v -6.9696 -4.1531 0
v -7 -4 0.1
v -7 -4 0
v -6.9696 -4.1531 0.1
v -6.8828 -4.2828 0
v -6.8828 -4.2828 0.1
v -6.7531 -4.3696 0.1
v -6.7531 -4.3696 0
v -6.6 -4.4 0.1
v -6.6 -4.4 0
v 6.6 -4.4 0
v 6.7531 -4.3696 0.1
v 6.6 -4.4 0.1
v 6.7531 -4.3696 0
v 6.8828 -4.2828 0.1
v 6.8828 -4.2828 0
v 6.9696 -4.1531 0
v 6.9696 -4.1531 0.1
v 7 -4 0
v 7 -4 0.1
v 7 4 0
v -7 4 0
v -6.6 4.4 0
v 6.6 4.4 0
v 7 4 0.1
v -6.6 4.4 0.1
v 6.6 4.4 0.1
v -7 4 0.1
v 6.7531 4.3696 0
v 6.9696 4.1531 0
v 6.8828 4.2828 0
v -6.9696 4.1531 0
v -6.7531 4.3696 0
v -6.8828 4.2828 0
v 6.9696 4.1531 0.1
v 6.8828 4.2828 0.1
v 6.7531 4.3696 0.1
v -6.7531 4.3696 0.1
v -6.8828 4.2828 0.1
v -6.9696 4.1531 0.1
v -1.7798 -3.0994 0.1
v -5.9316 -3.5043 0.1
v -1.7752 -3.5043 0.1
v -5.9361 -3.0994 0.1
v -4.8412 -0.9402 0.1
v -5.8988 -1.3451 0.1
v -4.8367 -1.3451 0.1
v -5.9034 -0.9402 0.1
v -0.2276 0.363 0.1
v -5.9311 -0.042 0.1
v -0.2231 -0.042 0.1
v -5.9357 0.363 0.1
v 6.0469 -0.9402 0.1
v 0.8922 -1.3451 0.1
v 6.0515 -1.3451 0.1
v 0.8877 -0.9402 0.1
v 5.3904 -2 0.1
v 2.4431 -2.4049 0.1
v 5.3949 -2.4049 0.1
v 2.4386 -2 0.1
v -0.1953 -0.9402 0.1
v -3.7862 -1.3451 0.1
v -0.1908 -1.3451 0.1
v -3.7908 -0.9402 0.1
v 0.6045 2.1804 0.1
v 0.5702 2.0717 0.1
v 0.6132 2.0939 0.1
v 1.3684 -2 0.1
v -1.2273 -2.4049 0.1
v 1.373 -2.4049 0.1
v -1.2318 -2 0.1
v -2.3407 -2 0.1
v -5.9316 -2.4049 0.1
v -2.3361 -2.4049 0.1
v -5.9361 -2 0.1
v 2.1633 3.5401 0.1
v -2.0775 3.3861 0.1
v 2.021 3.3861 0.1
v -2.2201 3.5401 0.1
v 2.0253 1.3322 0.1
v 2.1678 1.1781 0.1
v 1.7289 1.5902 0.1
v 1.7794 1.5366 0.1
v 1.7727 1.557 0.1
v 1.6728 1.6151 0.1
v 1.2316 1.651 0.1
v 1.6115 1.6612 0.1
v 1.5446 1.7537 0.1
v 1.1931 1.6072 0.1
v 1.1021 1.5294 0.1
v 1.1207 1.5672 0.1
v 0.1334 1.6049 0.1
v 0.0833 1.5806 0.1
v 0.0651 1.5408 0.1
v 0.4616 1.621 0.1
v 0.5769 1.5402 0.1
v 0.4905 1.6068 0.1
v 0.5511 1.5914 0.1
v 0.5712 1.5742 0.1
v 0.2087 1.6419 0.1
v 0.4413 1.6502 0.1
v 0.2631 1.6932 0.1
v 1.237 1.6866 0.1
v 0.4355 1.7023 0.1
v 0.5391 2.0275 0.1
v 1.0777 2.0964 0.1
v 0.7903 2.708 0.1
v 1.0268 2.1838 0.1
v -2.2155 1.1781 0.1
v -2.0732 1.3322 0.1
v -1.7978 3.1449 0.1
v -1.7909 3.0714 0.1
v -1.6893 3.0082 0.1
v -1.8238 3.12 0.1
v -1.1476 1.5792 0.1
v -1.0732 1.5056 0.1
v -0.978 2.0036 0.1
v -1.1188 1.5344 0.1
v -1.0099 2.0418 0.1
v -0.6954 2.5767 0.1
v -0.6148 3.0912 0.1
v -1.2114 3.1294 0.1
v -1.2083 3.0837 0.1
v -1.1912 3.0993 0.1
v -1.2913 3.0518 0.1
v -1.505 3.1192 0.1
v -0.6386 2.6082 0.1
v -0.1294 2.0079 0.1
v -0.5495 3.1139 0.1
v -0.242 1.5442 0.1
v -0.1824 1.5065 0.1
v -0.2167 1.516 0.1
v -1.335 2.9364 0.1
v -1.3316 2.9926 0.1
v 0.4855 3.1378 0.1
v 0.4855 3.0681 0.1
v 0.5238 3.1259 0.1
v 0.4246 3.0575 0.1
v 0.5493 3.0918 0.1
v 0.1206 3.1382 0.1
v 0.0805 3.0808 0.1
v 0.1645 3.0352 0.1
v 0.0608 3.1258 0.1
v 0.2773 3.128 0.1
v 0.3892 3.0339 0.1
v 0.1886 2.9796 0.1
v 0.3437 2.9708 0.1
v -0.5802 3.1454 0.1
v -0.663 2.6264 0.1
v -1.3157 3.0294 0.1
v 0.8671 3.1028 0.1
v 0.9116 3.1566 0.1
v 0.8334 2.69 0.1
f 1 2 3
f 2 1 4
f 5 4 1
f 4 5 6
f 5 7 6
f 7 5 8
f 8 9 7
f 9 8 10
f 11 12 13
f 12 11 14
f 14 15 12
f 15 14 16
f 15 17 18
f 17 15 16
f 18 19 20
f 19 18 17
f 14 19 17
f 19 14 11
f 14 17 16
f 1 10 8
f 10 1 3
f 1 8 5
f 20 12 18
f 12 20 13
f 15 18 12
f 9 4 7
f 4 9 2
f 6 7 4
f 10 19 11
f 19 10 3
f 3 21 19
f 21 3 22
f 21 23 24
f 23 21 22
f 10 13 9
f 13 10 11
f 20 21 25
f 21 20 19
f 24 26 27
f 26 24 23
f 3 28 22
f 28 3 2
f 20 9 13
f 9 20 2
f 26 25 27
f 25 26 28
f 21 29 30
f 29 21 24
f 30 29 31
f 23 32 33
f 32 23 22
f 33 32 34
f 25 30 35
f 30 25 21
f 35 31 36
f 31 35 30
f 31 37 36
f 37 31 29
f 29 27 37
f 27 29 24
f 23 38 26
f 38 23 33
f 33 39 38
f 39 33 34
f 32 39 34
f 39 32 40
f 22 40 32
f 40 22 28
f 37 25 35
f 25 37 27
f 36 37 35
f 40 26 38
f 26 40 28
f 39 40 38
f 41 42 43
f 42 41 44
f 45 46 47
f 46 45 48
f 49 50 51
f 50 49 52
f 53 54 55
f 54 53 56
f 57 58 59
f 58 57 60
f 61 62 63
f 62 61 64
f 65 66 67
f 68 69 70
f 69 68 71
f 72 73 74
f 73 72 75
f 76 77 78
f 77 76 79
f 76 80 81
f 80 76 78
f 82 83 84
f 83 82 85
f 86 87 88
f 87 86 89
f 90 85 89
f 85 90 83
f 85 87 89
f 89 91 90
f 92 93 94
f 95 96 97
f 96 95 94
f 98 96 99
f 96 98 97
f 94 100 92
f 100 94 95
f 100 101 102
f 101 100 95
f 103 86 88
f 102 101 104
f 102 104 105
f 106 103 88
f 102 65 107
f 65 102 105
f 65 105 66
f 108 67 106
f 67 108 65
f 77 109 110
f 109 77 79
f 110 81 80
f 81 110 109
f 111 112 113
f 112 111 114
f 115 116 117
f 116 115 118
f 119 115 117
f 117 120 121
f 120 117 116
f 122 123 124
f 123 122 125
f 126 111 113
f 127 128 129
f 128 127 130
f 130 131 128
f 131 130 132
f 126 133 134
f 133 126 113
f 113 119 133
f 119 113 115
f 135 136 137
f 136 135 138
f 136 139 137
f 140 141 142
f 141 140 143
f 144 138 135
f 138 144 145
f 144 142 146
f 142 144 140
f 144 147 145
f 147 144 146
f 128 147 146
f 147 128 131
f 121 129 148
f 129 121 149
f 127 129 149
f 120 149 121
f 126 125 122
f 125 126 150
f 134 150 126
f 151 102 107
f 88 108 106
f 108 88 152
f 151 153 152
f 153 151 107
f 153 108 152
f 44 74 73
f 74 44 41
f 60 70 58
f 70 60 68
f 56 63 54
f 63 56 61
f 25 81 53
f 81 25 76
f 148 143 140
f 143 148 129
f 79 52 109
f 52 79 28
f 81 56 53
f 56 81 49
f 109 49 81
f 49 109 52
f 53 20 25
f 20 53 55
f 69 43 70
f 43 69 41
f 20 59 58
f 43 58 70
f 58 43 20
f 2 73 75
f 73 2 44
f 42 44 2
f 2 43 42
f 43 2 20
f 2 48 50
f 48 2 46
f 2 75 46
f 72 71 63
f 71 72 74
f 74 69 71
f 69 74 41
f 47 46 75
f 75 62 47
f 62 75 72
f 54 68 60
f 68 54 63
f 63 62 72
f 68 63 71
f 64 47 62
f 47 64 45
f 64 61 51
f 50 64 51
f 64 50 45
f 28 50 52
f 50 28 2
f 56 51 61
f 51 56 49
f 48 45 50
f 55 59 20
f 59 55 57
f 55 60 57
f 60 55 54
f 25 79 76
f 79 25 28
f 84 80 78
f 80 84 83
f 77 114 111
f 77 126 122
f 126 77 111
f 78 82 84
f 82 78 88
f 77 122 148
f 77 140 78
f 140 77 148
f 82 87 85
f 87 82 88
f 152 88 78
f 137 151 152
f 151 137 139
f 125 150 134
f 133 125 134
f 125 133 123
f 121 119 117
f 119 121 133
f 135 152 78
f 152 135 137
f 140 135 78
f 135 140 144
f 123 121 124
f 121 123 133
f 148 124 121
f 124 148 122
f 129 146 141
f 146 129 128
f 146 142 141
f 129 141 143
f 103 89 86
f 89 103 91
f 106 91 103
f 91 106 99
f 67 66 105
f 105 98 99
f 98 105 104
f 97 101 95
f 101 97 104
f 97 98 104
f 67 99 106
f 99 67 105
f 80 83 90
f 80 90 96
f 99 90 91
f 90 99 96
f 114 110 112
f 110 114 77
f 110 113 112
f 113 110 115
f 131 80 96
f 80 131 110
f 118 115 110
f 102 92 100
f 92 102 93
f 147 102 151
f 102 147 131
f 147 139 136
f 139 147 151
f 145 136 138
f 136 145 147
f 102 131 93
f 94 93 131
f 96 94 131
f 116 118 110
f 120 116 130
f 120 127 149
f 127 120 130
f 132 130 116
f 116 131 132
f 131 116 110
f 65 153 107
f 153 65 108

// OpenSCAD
// file: ../p/1-4cyli.scad
use <../lib.scad>
function ldraw_lib__1_4cyli() = [
// 0 Cylinder 0.25
// 0 Name: 1-4cyli.dat
// 0 Author: James Jessiman
// 0 !LDRAW_ORG Primitive UPDATE 2012-01
// 0 !LICENSE Licensed under CC BY 4.0 : see CAreadme.txt
// 
// 0 BFC CERTIFY CCW
  [0,"BFC","CERTIFY"],
  [0,"BFC","CCW"],
// 
// 0 !HISTORY 2002-03-23 [sbliss] Added BFC statement.
// 0 !HISTORY 2002-04-25 [PTadmin] Official Update 2002-02
// 0 !HISTORY 2007-06-22 [PTadmin] Header formatted for Contributor Agreement
// 0 !HISTORY 2008-07-01 [PTadmin] Official Update 2008-01
// 0 !HISTORY 2012-02-16 [Philo] Changed to CCW
// 0 !HISTORY 2012-03-30 [PTadmin] Official Update 2012-01
// 
// 
// 4 16 1 1 0 0.9239 1 0.3827 0.9239 0 0.3827 1 0 0
  [4,16,1,1,0,0.9239,1,0.3827,0.9239,0,0.3827,1,0,0],
// 5 24 1 0 0 1 1 0 0.9239 0 0.3827 1 0 -1
  [5,24,1,0,0,1,1,0,0.9239,0,0.3827,1,0,-1],
// 4 16 0.9239 1 0.3827 0.7071 1 0.7071 0.7071 0 0.7071 0.9239 0 0.3827
  [4,16,0.9239,1,0.3827,0.7071,1,0.7071,0.7071,0,0.7071,0.9239,0,0.3827],
// 5 24 0.9239 0 0.3827 0.9239 1 0.3827 0.7071 0 0.7071 1 0 0
  [5,24,0.9239,0,0.3827,0.9239,1,0.3827,0.7071,0,0.7071,1,0,0],
// 4 16 0.7071 1 0.7071 0.3827 1 0.9239 0.3827 0 0.9239 0.7071 0 0.7071
  [4,16,0.7071,1,0.7071,0.3827,1,0.9239,0.3827,0,0.9239,0.7071,0,0.7071],
// 5 24 0.7071 0 0.7071 0.7071 1 0.7071 0.3827 0 0.9239 0.9239 0 0.3827
  [5,24,0.7071,0,0.7071,0.7071,1,0.7071,0.3827,0,0.9239,0.9239,0,0.3827],
// 4 16 0.3827 1 0.9239 0 1 1 0 0 1 0.3827 0 0.9239
  [4,16,0.3827,1,0.9239,0,1,1,0,0,1,0.3827,0,0.9239],
// 5 24 0.3827 0 0.9239 0.3827 1 0.9239 0 0 1 0.7071 0 0.7071
  [5,24,0.3827,0,0.9239,0.3827,1,0.9239,0,0,1,0.7071,0,0.7071],
// 5 24 0 0 1 0 1 1 0.3827 0 0.9239 -1 0 1
  [5,24,0,0,1,0,1,1,0.3827,0,0.9239,-1,0,1],
];
module ldraw_lib__1_4cyli(step=0, col=false, unit=2/5, alt=false, line=0.2, solid=!$preview)
    makepoly(ldraw_lib__1_4cyli(), step=step, col=col, unit=unit, alt=alt, line=line, solid=solid);
ldraw_lib__1_4cyli(line=0.2);
// file: ../p/1-4chrd.scad
use <../lib.scad>
function ldraw_lib__1_4chrd() = [
// 0 Chord 0.25
// 0 Name: 1-4chrd.dat
// 0 Author: Max Martin Richter [MMR1988]
// 0 !LDRAW_ORG Primitive UPDATE 2023-05
// 0 !LICENSE Licensed under CC BY 4.0 : see CAreadme.txt
// 
// 0 BFC CERTIFY CCW
  [0,"BFC","CERTIFY"],
  [0,"BFC","CCW"],
// 
// 0 !HISTORY 2004-04-22 [PTadmin] Official Update 2004-02
// 0 !HISTORY 2007-10-09 [PTadmin] Header formatted for Contributor Agreement
// 0 !HISTORY 2008-07-01 [PTadmin] Official Update 2008-01
// 0 !HISTORY 2012-08-02 [MMR1988] Re-creation with PrimGen2 and Rectifier
// 0 !HISTORY 2012-08-09 [PTadmin] Official Update 2012-02
// 0 !HISTORY 2023-10-27 [OrionP] Change author to MMR1988 from hafhead
// 0 !HISTORY 2023-10-31 [OrionP] Official Update 2023-05
// 
// 4 16 0.9239 0 0.3827 0.3827 0 0.9239 0 0 1 1 0 0
  [4,16,0.9239,0,0.3827,0.3827,0,0.9239,0,0,1,1,0,0],
// 3 16 0.7071 0 0.7071 0.3827 0 0.9239 0.9239 0 0.3827
  [3,16,0.7071,0,0.7071,0.3827,0,0.9239,0.9239,0,0.3827],
];
module ldraw_lib__1_4chrd(step=0, col=false, unit=2/5, alt=false, line=0.2, solid=!$preview)
    makepoly(ldraw_lib__1_4chrd(), step=step, col=col, unit=unit, alt=alt, line=line, solid=solid);
ldraw_lib__1_4chrd(line=0.2);
// main file
use <../lib.scad>
use <../p/1-4chrd.scad>
use <../p/1-4cyli.scad>
function ldraw_lib__6501596f() = [
// 0 Sticker  1.1 x  1.7 with "WA" Header Letter
// 0 Name: 6501596f.dat
// 0 Author: Philippe Hurbain [Philo]
// 0 !LDRAW_ORG Part UPDATE 2024-10
// 0 !LICENSE Licensed under CC BY 4.0 : see CAreadme.txt
// 
// 0 BFC CERTIFY CCW
  [0,"BFC","CERTIFY"],
  [0,"BFC","CCW"],
// 
// 0 !KEYWORDS Addams Family, Set 76780, Wednesday
// 
// 0 !HISTORY 2024-12-01 [OrionP] Official Update 2024-10
// 
// 1 16 -16.5 -0.25 -10 -1 0 0 0 0.25 0 0 0 -1 1-4cyli.dat
  [1,16,-16.5,-0.25,-10,-1,0,0,0,0.25,0,0,0,-1, ldraw_lib__1_4cyli()],
// 1 16 16.5 -0.25 -10 0 0 1 0 0.25 0 -1 0 0 1-4cyli.dat
  [1,16,16.5,-0.25,-10,0,0,1,0,0.25,0,-1,0,0, ldraw_lib__1_4cyli()],
// 1 16 16.5 0 -10 0 0 1 0 -1 0 -1 0 0 1-4chrd.dat
  [1,16,16.5,0,-10,0,0,1,0,-1,0,-1,0,0, ldraw_lib__1_4chrd()],
// 1 16 -16.5 0 -10 -1 0 0 0 -1 0 0 0 -1 1-4chrd.dat
  [1,16,-16.5,0,-10,-1,0,0,0,-1,0,0,0,-1, ldraw_lib__1_4chrd()],
// 1 15 16.5 -0.25 -10 0 0 1 0 1 0 -1 0 0 1-4chrd.dat
  [1,15,16.5,-0.25,-10,0,0,1,0,1,0,-1,0,0, ldraw_lib__1_4chrd()],
// 1 15 -16.5 -0.25 -10 -1 0 0 0 1 0 0 0 -1 1-4chrd.dat
  [1,15,-16.5,-0.25,-10,-1,0,0,0,1,0,0,0,-1, ldraw_lib__1_4chrd()],
// 4 16 16.5 0 -11 -16.5 0 -11 -17.5 0 -10 17.5 0 -10
  [4,16,16.5,0,-11,-16.5,0,-11,-17.5,0,-10,17.5,0,-10],
// 4 16 17.5 0 10 17.5 0 -10 -17.5 0 -10 -17.5 0 10
  [4,16,17.5,0,10,17.5,0,-10,-17.5,0,-10,-17.5,0,10],
// 4 16 17.5 0 10 -17.5 0 10 -16.5 0 11 16.5 0 11
  [4,16,17.5,0,10,-17.5,0,10,-16.5,0,11,16.5,0,11],
// 4 16 16.5 -0.25 -11 -16.5 -0.25 -11 -16.5 0 -11 16.5 0 -11
  [4,16,16.5,-0.25,-11,-16.5,-0.25,-11,-16.5,0,-11,16.5,0,-11],
// 4 16 17.5 -0.25 10 17.5 -0.25 -10 17.5 0 -10 17.5 0 10
  [4,16,17.5,-0.25,10,17.5,-0.25,-10,17.5,0,-10,17.5,0,10],
// 4 16 -16.5 -0.25 11 16.5 -0.25 11 16.5 0 11 -16.5 0 11
  [4,16,-16.5,-0.25,11,16.5,-0.25,11,16.5,0,11,-16.5,0,11],
// 4 16 -17.5 -0.25 -10 -17.5 -0.25 10 -17.5 0 10 -17.5 0 -10
  [4,16,-17.5,-0.25,-10,-17.5,-0.25,10,-17.5,0,10,-17.5,0,-10],
// 4 15 -17.5 -0.25 -10 -16.5 -0.25 -11 16.5 -0.25 -11 17.5 -0.25 -10
  [4,15,-17.5,-0.25,-10,-16.5,-0.25,-11,16.5,-0.25,-11,17.5,-0.25,-10],
// 4 15 17.5 -0.25 10 16.5 -0.25 11 -16.5 -0.25 11 -17.5 -0.25 10
  [4,15,17.5,-0.25,10,16.5,-0.25,11,-16.5,-0.25,11,-17.5,-0.25,10],
// 1 16 16.5 0 10 1 0 0 0 -1 0 0 0 1 1-4chrd.dat
  [1,16,16.5,0,10,1,0,0,0,-1,0,0,0,1, ldraw_lib__1_4chrd()],
// 1 16 -16.5 0 10 0 0 -1 0 -1 0 1 0 0 1-4chrd.dat
  [1,16,-16.5,0,10,0,0,-1,0,-1,0,1,0,0, ldraw_lib__1_4chrd()],
// 1 16 16.5 -0.25 10 1 0 0 0 0.25 0 0 0 1 1-4cyli.dat
  [1,16,16.5,-0.25,10,1,0,0,0,0.25,0,0,0,1, ldraw_lib__1_4cyli()],
// 1 16 -16.5 -0.25 10 0 0 -1 0 0.25 0 1 0 0 1-4cyli.dat
  [1,16,-16.5,-0.25,10,0,0,-1,0,0.25,0,1,0,0, ldraw_lib__1_4cyli()],
// 1 15 16.5 -0.25 10 1 0 0 0 1 0 0 0 1 1-4chrd.dat
  [1,15,16.5,-0.25,10,1,0,0,0,1,0,0,0,1, ldraw_lib__1_4chrd()],
// 1 15 -16.5 -0.25 10 0 0 -1 0 1 0 1 0 0 1-4chrd.dat
  [1,15,-16.5,-0.25,10,0,0,-1,0,1,0,1,0,0, ldraw_lib__1_4chrd()],
// 4 0 -14.8403 -0.25 -7.7484 -14.8289 -0.25 -8.7608 -4.438 -0.25 -8.7608 -4.4494 -0.25 -7.7484
  [4,0,-14.8403,-0.25,-7.7484,-14.8289,-0.25,-8.7608,-4.438,-0.25,-8.7608,-4.4494,-0.25,-7.7484],
// 4 0 -12.0917 -0.25 -3.3628 -12.1031 -0.25 -2.3504 -14.7585 -0.25 -2.3504 -14.7471 -0.25 -3.3628
  [4,0,-12.0917,-0.25,-3.3628,-12.1031,-0.25,-2.3504,-14.7585,-0.25,-2.3504,-14.7471,-0.25,-3.3628],
// 4 0 -0.5577 -0.25 -0.1049 -0.5691 -0.25 0.9075 -14.8392 -0.25 0.9075 -14.8278 -0.25 -0.1049
  [4,0,-0.5577,-0.25,-0.1049,-0.5691,-0.25,0.9075,-14.8392,-0.25,0.9075,-14.8278,-0.25,-0.1049],
// 4 0 15.1287 -0.25 -3.3628 15.1173 -0.25 -2.3504 2.2192 -0.25 -2.3504 2.2306 -0.25 -3.3628
  [4,0,15.1287,-0.25,-3.3628,15.1173,-0.25,-2.3504,2.2192,-0.25,-2.3504,2.2306,-0.25,-3.3628],
// 4 0 6.0964 -0.25 -5 6.1078 -0.25 -6.0122 13.4873 -0.25 -6.0122 13.4759 -0.25 -5
  [4,0,6.0964,-0.25,-5,6.1078,-0.25,-6.0122,13.4873,-0.25,-6.0122,13.4759,-0.25,-5],
// 4 0 -9.4769 -0.25 -2.3504 -9.4655 -0.25 -3.3628 -0.4769 -0.25 -3.3628 -0.4883 -0.25 -2.3504
  [4,0,-9.4769,-0.25,-2.3504,-9.4655,-0.25,-3.3628,-0.4769,-0.25,-3.3628,-0.4883,-0.25,-2.3504],
// 3 0 1.5113 -0.25 5.4511 1.4254 -0.25 5.1793 1.533 -0.25 5.2348
  [3,0,1.5113,-0.25,5.4511,1.4254,-0.25,5.1793,1.533,-0.25,5.2348],
// 4 0 3.4326 -0.25 -6.0122 3.4211 -0.25 -5 -3.0796 -0.25 -5 -3.0682 -0.25 -6.0122
  [4,0,3.4326,-0.25,-6.0122,3.4211,-0.25,-5,-3.0796,-0.25,-5,-3.0682,-0.25,-6.0122],
// 4 0 -5.8403 -0.25 -6.0122 -5.8518 -0.25 -5 -14.8403 -0.25 -5 -14.8289 -0.25 -6.0122
  [4,0,-5.8403,-0.25,-6.0122,-5.8518,-0.25,-5,-14.8403,-0.25,-5,-14.8289,-0.25,-6.0122],
// 4 0 5.0525 -0.25 8.4652 5.4082 -0.25 8.8503 -5.5502 -0.25 8.8503 -5.1938 -0.25 8.4652
  [4,0,5.0525,-0.25,8.4652,5.4082,-0.25,8.8503,-5.5502,-0.25,8.8503,-5.1938,-0.25,8.4652],
// 4 0 5.4196 -0.25 2.9453 5.4082 -0.25 8.8503 5.0525 -0.25 8.4652 5.0632 -0.25 3.3304
  [4,0,5.4196,-0.25,2.9453,5.4082,-0.25,8.8503,5.0525,-0.25,8.4652,5.0632,-0.25,3.3304],
// 4 0 4.4317 -0.25 3.8924 4.3223 -0.25 3.9754 4.1819 -0.25 4.0378 4.4484 -0.25 3.8416
  [4,0,4.4317,-0.25,3.8924,4.3223,-0.25,3.9754,4.1819,-0.25,4.0378,4.4484,-0.25,3.8416],
// 4 0 2.9827 -0.25 4.0181 4.0287 -0.25 4.1531 3.8614 -0.25 4.3842 3.079 -0.25 4.1274
  [4,0,2.9827,-0.25,4.0181,4.0287,-0.25,4.1531,3.8614,-0.25,4.3842,3.079,-0.25,4.1274],
// 4 0 4.4484 -0.25 3.8416 4.1819 -0.25 4.0378 2.9827 -0.25 4.0181 2.7552 -0.25 3.8235
  [4,0,4.4484,-0.25,3.8416,4.1819,-0.25,4.0378,2.9827,-0.25,4.0181,2.7552,-0.25,3.8235],
// 3 0 4.1819 -0.25 4.0378 4.0287 -0.25 4.1531 2.9827 -0.25 4.0181
  [3,0,4.1819,-0.25,4.0378,4.0287,-0.25,4.1531,2.9827,-0.25,4.0181],
// 3 0 2.9827 -0.25 4.0181 2.8018 -0.25 3.9179 2.7552 -0.25 3.8235
  [3,0,2.9827,-0.25,4.0181,2.8018,-0.25,3.9179,2.7552,-0.25,3.8235],
// 3 0 0.3335 -0.25 4.0122 0.2082 -0.25 3.9514 0.1627 -0.25 3.8519
  [3,0,0.3335,-0.25,4.0122,0.2082,-0.25,3.9514,0.1627,-0.25,3.8519],
// 4 0 1.154 -0.25 4.0526 0.1627 -0.25 3.8519 1.4422 -0.25 3.8505 1.2262 -0.25 4.0171
  [4,0,1.154,-0.25,4.0526,0.1627,-0.25,3.8519,1.4422,-0.25,3.8505,1.2262,-0.25,4.0171],
// 4 0 1.4281 -0.25 3.9356 1.3777 -0.25 3.9785 1.2262 -0.25 4.0171 1.4422 -0.25 3.8505
  [4,0,1.4281,-0.25,3.9356,1.3777,-0.25,3.9785,1.2262,-0.25,4.0171,1.4422,-0.25,3.8505],
// 4 0 1.154 -0.25 4.0526 0.5217 -0.25 4.1048 0.3335 -0.25 4.0122 0.1627 -0.25 3.8519
  [4,0,1.154,-0.25,4.0526,0.5217,-0.25,4.1048,0.3335,-0.25,4.0122,0.1627,-0.25,3.8519],
// 4 0 0.6578 -0.25 4.233 0.5217 -0.25 4.1048 1.154 -0.25 4.0526 1.1033 -0.25 4.1255
  [4,0,0.6578,-0.25,4.233,0.5217,-0.25,4.1048,1.154,-0.25,4.0526,1.1033,-0.25,4.1255],
// 3 0 3.0925 -0.25 4.2164 3.079 -0.25 4.1274 3.8614 -0.25 4.3842
  [3,0,3.0925,-0.25,4.2164,3.079,-0.25,4.1274,3.8614,-0.25,4.3842],
// 3 0 0.6578 -0.25 4.233 1.1033 -0.25 4.1255 1.0887 -0.25 4.2557
  [3,0,0.6578,-0.25,4.233,1.1033,-0.25,4.1255,1.0887,-0.25,4.2557],
// 3 0 0.6578 -0.25 4.233 1.0887 -0.25 4.2557 1.3478 -0.25 5.0687
  [3,0,0.6578,-0.25,4.233,1.0887,-0.25,4.2557,1.3478,-0.25,5.0687],
// 3 0 2.6942 -0.25 5.241 3.0925 -0.25 4.2164 3.8614 -0.25 4.3842
  [3,0,2.6942,-0.25,5.241,3.0925,-0.25,4.2164,3.8614,-0.25,4.3842],
// 4 0 1.9757 -0.25 6.7701 0.6578 -0.25 4.233 1.3478 -0.25 5.0687 1.5113 -0.25 5.4511
  [4,0,1.9757,-0.25,6.7701,0.6578,-0.25,4.233,1.3478,-0.25,5.0687,1.5113,-0.25,5.4511],
// 3 0 1.5113 -0.25 5.4511 1.3478 -0.25 5.0687 1.4254 -0.25 5.1793
  [3,0,1.5113,-0.25,5.4511,1.3478,-0.25,5.0687,1.4254,-0.25,5.1793],
// 4 0 2.6942 -0.25 5.241 2.567 -0.25 5.4594 1.5113 -0.25 5.4511 1.533 -0.25 5.2348
  [4,0,2.6942,-0.25,5.241,2.567,-0.25,5.4594,1.5113,-0.25,5.4511,1.533,-0.25,5.2348],
// 4 0 -5.1831 -0.25 3.3304 -5.1938 -0.25 8.4652 -5.5502 -0.25 8.8503 -5.5388 -0.25 2.9453
  [4,0,-5.1831,-0.25,3.3304,-5.1938,-0.25,8.4652,-5.5502,-0.25,8.8503,-5.5388,-0.25,2.9453],
// 4 0 -5.1831 -0.25 3.3304 -5.5388 -0.25 2.9453 5.4196 -0.25 2.9453 5.0632 -0.25 3.3304
  [4,0,-5.1831,-0.25,3.3304,-5.5388,-0.25,2.9453,5.4196,-0.25,2.9453,5.0632,-0.25,3.3304],
// 4 0 -4.2233 -0.25 7.5205 -4.4946 -0.25 7.8622 -4.5594 -0.25 7.8 -4.4772 -0.25 7.6784
  [4,0,-4.2233,-0.25,7.5205,-4.4946,-0.25,7.8622,-4.5594,-0.25,7.8,-4.4772,-0.25,7.6784],
// 4 0 -2.445 -0.25 5.009 -2.8691 -0.25 3.9479 -2.7971 -0.25 3.836 -2.6831 -0.25 3.7641
  [4,0,-2.445,-0.25,5.009,-2.8691,-0.25,3.9479,-2.7971,-0.25,3.836,-2.6831,-0.25,3.7641],
// 3 0 -2.5248 -0.25 5.1045 -2.8691 -0.25 3.9479 -2.445 -0.25 5.009
  [3,0,-2.5248,-0.25,5.1045,-2.8691,-0.25,3.9479,-2.445,-0.25,5.009],
// 4 0 -1.5369 -0.25 7.7279 -2.445 -0.25 5.009 -2.6831 -0.25 3.7641 -1.7385 -0.25 6.4417
  [4,0,-1.5369,-0.25,7.7279,-2.445,-0.25,5.009,-2.6831,-0.25,3.7641,-1.7385,-0.25,6.4417],
// 4 0 -2.978 -0.25 7.7482 -3.0286 -0.25 7.8234 -3.2282 -0.25 7.6296 -3.0208 -0.25 7.7092
  [4,0,-2.978,-0.25,7.7482,-3.0286,-0.25,7.8234,-3.2282,-0.25,7.6296,-3.0208,-0.25,7.7092],
// 3 0 -3.7624 -0.25 7.7981 -4.4946 -0.25 7.8622 -4.2233 -0.25 7.5205
  [3,0,-3.7624,-0.25,7.7981,-4.4946,-0.25,7.8622,-4.2233,-0.25,7.5205],
// 4 0 -1.3737 -0.25 7.7847 -1.5966 -0.25 6.5205 -0.6049 -0.25 3.8604 -0.3236 -0.25 5.0198
  [4,0,-1.3737,-0.25,7.7847,-1.5966,-0.25,6.5205,-0.6049,-0.25,3.8604,-0.3236,-0.25,5.0198],
// 4 0 -0.5418 -0.25 3.79 -0.4559 -0.25 3.7662 -0.3236 -0.25 5.0198 -0.6049 -0.25 3.8604
  [4,0,-0.5418,-0.25,3.79,-0.4559,-0.25,3.7662,-0.3236,-0.25,5.0198,-0.6049,-0.25,3.8604],
// 4 0 -3.3291 -0.25 7.4814 -3.7624 -0.25 7.7981 -4.2233 -0.25 7.5205 -3.3375 -0.25 7.3409
  [4,0,-3.3291,-0.25,7.4814,-3.7624,-0.25,7.7981,-4.2233,-0.25,7.5205,-3.3375,-0.25,7.3409],
// 4 0 -2.8691 -0.25 3.9479 -2.5248 -0.25 5.1045 -3.3375 -0.25 7.3409 -4.2233 -0.25 7.5205
  [4,0,-2.8691,-0.25,3.9479,-2.5248,-0.25,5.1045,-3.3375,-0.25,7.3409,-4.2233,-0.25,7.5205],
// 4 0 1.3094 -0.25 7.8148 1.2138 -0.25 7.8446 1.0614 -0.25 7.6437 1.2137 -0.25 7.6703
  [4,0,1.3094,-0.25,7.8148,1.2138,-0.25,7.8446,1.0614,-0.25,7.6437,1.2137,-0.25,7.6703],
// 3 0 1.2137 -0.25 7.6703 1.3732 -0.25 7.7294 1.3094 -0.25 7.8148
  [3,0,1.2137,-0.25,7.6703,1.3732,-0.25,7.7294,1.3094,-0.25,7.8148],
// 4 0 0.1521 -0.25 7.8144 0.2013 -0.25 7.7019 0.4113 -0.25 7.5879 0.3016 -0.25 7.8454
  [4,0,0.1521,-0.25,7.8144,0.2013,-0.25,7.7019,0.4113,-0.25,7.5879,0.3016,-0.25,7.8454],
// 4 0 1.2138 -0.25 7.8446 0.6932 -0.25 7.8199 0.973 -0.25 7.5848 1.0614 -0.25 7.6437
  [4,0,1.2138,-0.25,7.8446,0.6932,-0.25,7.8199,0.973,-0.25,7.5848,1.0614,-0.25,7.6437],
// 4 0 0.3016 -0.25 7.8454 0.4113 -0.25 7.5879 0.4716 -0.25 7.4491 0.6932 -0.25 7.8199
  [4,0,0.3016,-0.25,7.8454,0.4113,-0.25,7.5879,0.4716,-0.25,7.4491,0.6932,-0.25,7.8199],
// 4 0 0.973 -0.25 7.5848 0.6932 -0.25 7.8199 0.4716 -0.25 7.4491 0.8593 -0.25 7.4271
  [4,0,0.973,-0.25,7.5848,0.6932,-0.25,7.8199,0.4716,-0.25,7.4491,0.8593,-0.25,7.4271],
// 4 0 -0.4559 -0.25 3.7662 0.8593 -0.25 7.4271 0.4716 -0.25 7.4491 -0.3236 -0.25 5.0198
  [4,0,-0.4559,-0.25,3.7662,0.8593,-0.25,7.4271,0.4716,-0.25,7.4491,-0.3236,-0.25,5.0198],
// 4 0 -1.4504 -0.25 7.8634 -1.5369 -0.25 7.7279 -1.6576 -0.25 6.566 -1.3737 -0.25 7.7847
  [4,0,-1.4504,-0.25,7.8634,-1.5369,-0.25,7.7279,-1.6576,-0.25,6.566,-1.3737,-0.25,7.7847],
// 3 0 -1.5966 -0.25 6.5205 -1.3737 -0.25 7.7847 -1.6576 -0.25 6.566
  [3,0,-1.5966,-0.25,6.5205,-1.3737,-0.25,7.7847,-1.6576,-0.25,6.566],
// 3 0 -1.7385 -0.25 6.4417 -1.6576 -0.25 6.566 -1.5369 -0.25 7.7279
  [3,0,-1.7385,-0.25,6.4417,-1.6576,-0.25,6.566,-1.5369,-0.25,7.7279],
// 4 0 -3.0286 -0.25 7.8234 -3.7624 -0.25 7.7981 -3.2892 -0.25 7.5734 -3.2282 -0.25 7.6296
  [4,0,-3.0286,-0.25,7.8234,-3.7624,-0.25,7.7981,-3.2892,-0.25,7.5734,-3.2282,-0.25,7.6296],
// 3 0 -3.3291 -0.25 7.4814 -3.2892 -0.25 7.5734 -3.7624 -0.25 7.7981
  [3,0,-3.3291,-0.25,7.4814,-3.2892,-0.25,7.5734,-3.7624,-0.25,7.7981],
// 3 0 2.1677 -0.25 7.7571 0.6578 -0.25 4.233 1.9757 -0.25 6.7701
  [3,0,2.1677,-0.25,7.7571,0.6578,-0.25,4.233,1.9757,-0.25,6.7701],
// 4 0 2.6942 -0.25 5.241 3.8614 -0.25 4.3842 2.2791 -0.25 7.8915 2.567 -0.25 5.4594
  [4,0,2.6942,-0.25,5.241,3.8614,-0.25,4.3842,2.2791,-0.25,7.8915,2.567,-0.25,5.4594],
// 4 0 1.9757 -0.25 6.7701 2.0835 -0.25 6.725 2.2791 -0.25 7.8915 2.1677 -0.25 7.7571
  [4,0,1.9757,-0.25,6.7701,2.0835,-0.25,6.725,2.2791,-0.25,7.8915,2.1677,-0.25,7.7571],
// 3 0 2.0835 -0.25 6.725 2.567 -0.25 5.4594 2.2791 -0.25 7.8915
  [3,0,2.0835,-0.25,6.725,2.567,-0.25,5.4594,2.2791,-0.25,7.8915],
// 4 15 -14.8289 -0.25 -6.0122 -14.8403 -0.25 -7.7484 -4.4494 -0.25 -7.7484 -5.8403 -0.25 -6.0122
  [4,15,-14.8289,-0.25,-6.0122,-14.8403,-0.25,-7.7484,-4.4494,-0.25,-7.7484,-5.8403,-0.25,-6.0122],
// 4 15 6.1078 -0.25 -6.0122 6.0964 -0.25 -5 3.4211 -0.25 -5 3.4326 -0.25 -6.0122
  [4,15,6.1078,-0.25,-6.0122,6.0964,-0.25,-5,3.4211,-0.25,-5,3.4326,-0.25,-6.0122],
// 4 15 -0.4883 -0.25 -2.3504 -0.4769 -0.25 -3.3628 2.2306 -0.25 -3.3628 2.2192 -0.25 -2.3504
  [4,15,-0.4883,-0.25,-2.3504,-0.4769,-0.25,-3.3628,2.2306,-0.25,-3.3628,2.2192,-0.25,-2.3504],
// 4 15 15.1173 -0.25 -2.3504 17.5 -0.25 10 5.4082 -0.25 8.8503 5.4196 -0.25 2.9453
  [4,15,15.1173,-0.25,-2.3504,17.5,-0.25,10,5.4082,-0.25,8.8503,5.4196,-0.25,2.9453],
// 4 15 -1.3737 -0.25 7.7847 0.1521 -0.25 7.8144 0.3016 -0.25 7.8454 -1.4504 -0.25 7.8634
  [4,15,-1.3737,-0.25,7.7847,0.1521,-0.25,7.8144,0.3016,-0.25,7.8454,-1.4504,-0.25,7.8634],
// 4 15 -5.5388 -0.25 2.9453 -5.5502 -0.25 8.8503 -17.5 -0.25 10 -14.8392 -0.25 0.9075
  [4,15,-5.5388,-0.25,2.9453,-5.5502,-0.25,8.8503,-17.5,-0.25,10,-14.8392,-0.25,0.9075],
// 4 15 -0.5691 -0.25 0.9075 2.2192 -0.25 -2.3504 15.1173 -0.25 -2.3504 5.4196 -0.25 2.9453
  [4,15,-0.5691,-0.25,0.9075,2.2192,-0.25,-2.3504,15.1173,-0.25,-2.3504,5.4196,-0.25,2.9453],
// 4 15 5.4196 -0.25 2.9453 -5.5388 -0.25 2.9453 -14.8392 -0.25 0.9075 -0.5691 -0.25 0.9075
  [4,15,5.4196,-0.25,2.9453,-5.5388,-0.25,2.9453,-14.8392,-0.25,0.9075,-0.5691,-0.25,0.9075],
// 4 15 15.1287 -0.25 -3.3628 17.5 -0.25 -10 17.5 -0.25 10 15.1173 -0.25 -2.3504
  [4,15,15.1287,-0.25,-3.3628,17.5,-0.25,-10,17.5,-0.25,10,15.1173,-0.25,-2.3504],
// 4 15 -4.4494 -0.25 -7.7484 -4.438 -0.25 -8.7608 3.4326 -0.25 -6.0122 -3.0682 -0.25 -6.0122
  [4,15,-4.4494,-0.25,-7.7484,-4.438,-0.25,-8.7608,3.4326,-0.25,-6.0122,-3.0682,-0.25,-6.0122],
// 3 15 17.5 -0.25 -10 13.4873 -0.25 -6.0122 6.1078 -0.25 -6.0122
  [3,15,17.5,-0.25,-10,13.4873,-0.25,-6.0122,6.1078,-0.25,-6.0122],
// 4 15 3.4326 -0.25 -6.0122 -4.438 -0.25 -8.7608 17.5 -0.25 -10 6.1078 -0.25 -6.0122
  [4,15,3.4326,-0.25,-6.0122,-4.438,-0.25,-8.7608,17.5,-0.25,-10,6.1078,-0.25,-6.0122],
// 4 15 -14.8403 -0.25 -5 -17.5 -0.25 -10 -14.8403 -0.25 -7.7484 -14.8289 -0.25 -6.0122
  [4,15,-14.8403,-0.25,-5,-17.5,-0.25,-10,-14.8403,-0.25,-7.7484,-14.8289,-0.25,-6.0122],
// 3 15 -14.8289 -0.25 -8.7608 -14.8403 -0.25 -7.7484 -17.5 -0.25 -10
  [3,15,-14.8289,-0.25,-8.7608,-14.8403,-0.25,-7.7484,-17.5,-0.25,-10],
// 4 15 -14.8289 -0.25 -8.7608 -17.5 -0.25 -10 17.5 -0.25 -10 -4.438 -0.25 -8.7608
  [4,15,-14.8289,-0.25,-8.7608,-17.5,-0.25,-10,17.5,-0.25,-10,-4.438,-0.25,-8.7608],
// 4 15 -14.8278 -0.25 -0.1049 -17.5 -0.25 -10 -14.7471 -0.25 -3.3628 -14.7585 -0.25 -2.3504
  [4,15,-14.8278,-0.25,-0.1049,-17.5,-0.25,-10,-14.7471,-0.25,-3.3628,-14.7585,-0.25,-2.3504],
// 3 15 -17.5 -0.25 -10 -14.8403 -0.25 -5 -14.7471 -0.25 -3.3628
  [3,15,-17.5,-0.25,-10,-14.8403,-0.25,-5,-14.7471,-0.25,-3.3628],
// 4 15 -0.4769 -0.25 -3.3628 -5.8518 -0.25 -5 -5.8403 -0.25 -6.0122 -3.0796 -0.25 -5
  [4,15,-0.4769,-0.25,-3.3628,-5.8518,-0.25,-5,-5.8403,-0.25,-6.0122,-3.0796,-0.25,-5],
// 4 15 -4.4494 -0.25 -7.7484 -3.0682 -0.25 -6.0122 -3.0796 -0.25 -5 -5.8403 -0.25 -6.0122
  [4,15,-4.4494,-0.25,-7.7484,-3.0682,-0.25,-6.0122,-3.0796,-0.25,-5,-5.8403,-0.25,-6.0122],
// 3 15 -12.0917 -0.25 -3.3628 -14.7471 -0.25 -3.3628 -14.8403 -0.25 -5
  [3,15,-12.0917,-0.25,-3.3628,-14.7471,-0.25,-3.3628,-14.8403,-0.25,-5],
// 4 15 -12.0917 -0.25 -3.3628 -14.8403 -0.25 -5 -5.8518 -0.25 -5 -9.4655 -0.25 -3.3628
  [4,15,-12.0917,-0.25,-3.3628,-14.8403,-0.25,-5,-5.8518,-0.25,-5,-9.4655,-0.25,-3.3628],
// 4 15 2.2306 -0.25 -3.3628 -0.4769 -0.25 -3.3628 3.4211 -0.25 -5 6.0964 -0.25 -5
  [4,15,2.2306,-0.25,-3.3628,-0.4769,-0.25,-3.3628,3.4211,-0.25,-5,6.0964,-0.25,-5],
// 3 15 -0.4769 -0.25 -3.3628 -9.4655 -0.25 -3.3628 -5.8518 -0.25 -5
  [3,15,-0.4769,-0.25,-3.3628,-9.4655,-0.25,-3.3628,-5.8518,-0.25,-5],
// 3 15 3.4211 -0.25 -5 -0.4769 -0.25 -3.3628 -3.0796 -0.25 -5
  [3,15,3.4211,-0.25,-5,-0.4769,-0.25,-3.3628,-3.0796,-0.25,-5],
// 4 15 -12.1031 -0.25 -2.3504 -12.0917 -0.25 -3.3628 -9.4655 -0.25 -3.3628 -9.4769 -0.25 -2.3504
  [4,15,-12.1031,-0.25,-2.3504,-12.0917,-0.25,-3.3628,-9.4655,-0.25,-3.3628,-9.4769,-0.25,-2.3504],
// 3 15 -9.4769 -0.25 -2.3504 -0.4883 -0.25 -2.3504 -0.5577 -0.25 -0.1049
  [3,15,-9.4769,-0.25,-2.3504,-0.4883,-0.25,-2.3504,-0.5577,-0.25,-0.1049],
// 4 15 -12.1031 -0.25 -2.3504 -9.4769 -0.25 -2.3504 -0.5577 -0.25 -0.1049 -14.8278 -0.25 -0.1049
  [4,15,-12.1031,-0.25,-2.3504,-9.4769,-0.25,-2.3504,-0.5577,-0.25,-0.1049,-14.8278,-0.25,-0.1049],
// 4 15 -17.5 -0.25 -10 -14.8278 -0.25 -0.1049 -14.8392 -0.25 0.9075 -17.5 -0.25 10
  [4,15,-17.5,-0.25,-10,-14.8278,-0.25,-0.1049,-14.8392,-0.25,0.9075,-17.5,-0.25,10],
// 4 15 -0.5691 -0.25 0.9075 -0.5577 -0.25 -0.1049 -0.4883 -0.25 -2.3504 2.2192 -0.25 -2.3504
  [4,15,-0.5691,-0.25,0.9075,-0.5577,-0.25,-0.1049,-0.4883,-0.25,-2.3504,2.2192,-0.25,-2.3504],
// 3 15 -14.7585 -0.25 -2.3504 -12.1031 -0.25 -2.3504 -14.8278 -0.25 -0.1049
  [3,15,-14.7585,-0.25,-2.3504,-12.1031,-0.25,-2.3504,-14.8278,-0.25,-0.1049],
// 4 15 17.5 -0.25 -10 15.1287 -0.25 -3.3628 13.4759 -0.25 -5 13.4873 -0.25 -6.0122
  [4,15,17.5,-0.25,-10,15.1287,-0.25,-3.3628,13.4759,-0.25,-5,13.4873,-0.25,-6.0122],
// 4 15 2.2306 -0.25 -3.3628 6.0964 -0.25 -5 13.4759 -0.25 -5 15.1287 -0.25 -3.3628
  [4,15,2.2306,-0.25,-3.3628,6.0964,-0.25,-5,13.4759,-0.25,-5,15.1287,-0.25,-3.3628],
// 4 15 17.5 -0.25 10 -17.5 -0.25 10 -5.5502 -0.25 8.8503 5.4082 -0.25 8.8503
  [4,15,17.5,-0.25,10,-17.5,-0.25,10,-5.5502,-0.25,8.8503,5.4082,-0.25,8.8503],
// 4 15 4.4484 -0.25 3.8416 5.0632 -0.25 3.3304 5.0525 -0.25 8.4652 4.4317 -0.25 3.8924
  [4,15,4.4484,-0.25,3.8416,5.0632,-0.25,3.3304,5.0525,-0.25,8.4652,4.4317,-0.25,3.8924],
// 3 15 -5.1938 -0.25 8.4652 -4.5594 -0.25 7.8 -4.4946 -0.25 7.8622
  [3,15,-5.1938,-0.25,8.4652,-4.5594,-0.25,7.8,-4.4946,-0.25,7.8622],
// 4 15 -4.4946 -0.25 7.8622 -3.7624 -0.25 7.7981 -3.0286 -0.25 7.8234 -5.1938 -0.25 8.4652
  [4,15,-4.4946,-0.25,7.8622,-3.7624,-0.25,7.7981,-3.0286,-0.25,7.8234,-5.1938,-0.25,8.4652],
// 4 15 3.8614 -0.25 4.3842 4.3223 -0.25 3.9754 4.4317 -0.25 3.8924 5.0525 -0.25 8.4652
  [4,15,3.8614,-0.25,4.3842,4.3223,-0.25,3.9754,4.4317,-0.25,3.8924,5.0525,-0.25,8.4652],
// 3 15 -5.1938 -0.25 8.4652 -3.0286 -0.25 7.8234 -1.4504 -0.25 7.8634
  [3,15,-5.1938,-0.25,8.4652,-3.0286,-0.25,7.8234,-1.4504,-0.25,7.8634],
// 4 15 5.0525 -0.25 8.4652 -5.1938 -0.25 8.4652 -1.4504 -0.25 7.8634 0.3016 -0.25 7.8454
  [4,15,5.0525,-0.25,8.4652,-5.1938,-0.25,8.4652,-1.4504,-0.25,7.8634,0.3016,-0.25,7.8454],
// 4 15 4.1819 -0.25 4.0378 4.3223 -0.25 3.9754 3.8614 -0.25 4.3842 4.0287 -0.25 4.1531
  [4,15,4.1819,-0.25,4.0378,4.3223,-0.25,3.9754,3.8614,-0.25,4.3842,4.0287,-0.25,4.1531],
// 3 15 2.2791 -0.25 7.8915 3.8614 -0.25 4.3842 5.0525 -0.25 8.4652
  [3,15,2.2791,-0.25,7.8915,3.8614,-0.25,4.3842,5.0525,-0.25,8.4652],
// 4 15 1.3732 -0.25 7.7294 2.1677 -0.25 7.7571 2.2791 -0.25 7.8915 1.3094 -0.25 7.8148
  [4,15,1.3732,-0.25,7.7294,2.1677,-0.25,7.7571,2.2791,-0.25,7.8915,1.3094,-0.25,7.8148],
// 3 15 -3.2282 -0.25 7.6296 -3.2892 -0.25 7.5734 -3.3291 -0.25 7.4814
  [3,15,-3.2282,-0.25,7.6296,-3.2892,-0.25,7.5734,-3.3291,-0.25,7.4814],
// 4 15 -3.0208 -0.25 7.7092 -3.2282 -0.25 7.6296 -3.3291 -0.25 7.4814 -3.3375 -0.25 7.3409
  [4,15,-3.0208,-0.25,7.7092,-3.2282,-0.25,7.6296,-3.3291,-0.25,7.4814,-3.3375,-0.25,7.3409],
// 4 15 -3.3375 -0.25 7.3409 -2.5248 -0.25 5.1045 -2.445 -0.25 5.009 -1.5369 -0.25 7.7279
  [4,15,-3.3375,-0.25,7.3409,-2.5248,-0.25,5.1045,-2.445,-0.25,5.009,-1.5369,-0.25,7.7279],
// 4 15 1.3094 -0.25 7.8148 2.2791 -0.25 7.8915 5.0525 -0.25 8.4652 1.2138 -0.25 7.8446
  [4,15,1.3094,-0.25,7.8148,2.2791,-0.25,7.8915,5.0525,-0.25,8.4652,1.2138,-0.25,7.8446],
// 4 15 5.0525 -0.25 8.4652 0.3016 -0.25 7.8454 0.6932 -0.25 7.8199 1.2138 -0.25 7.8446
  [4,15,5.0525,-0.25,8.4652,0.3016,-0.25,7.8454,0.6932,-0.25,7.8199,1.2138,-0.25,7.8446],
// 4 15 -2.978 -0.25 7.7482 -3.0208 -0.25 7.7092 -3.3375 -0.25 7.3409 -1.5369 -0.25 7.7279
  [4,15,-2.978,-0.25,7.7482,-3.0208,-0.25,7.7092,-3.3375,-0.25,7.3409,-1.5369,-0.25,7.7279],
// 4 15 -3.0286 -0.25 7.8234 -2.978 -0.25 7.7482 -1.5369 -0.25 7.7279 -1.4504 -0.25 7.8634
  [4,15,-3.0286,-0.25,7.8234,-2.978,-0.25,7.7482,-1.5369,-0.25,7.7279,-1.4504,-0.25,7.8634],
// 4 15 0.2013 -0.25 7.7019 -1.3737 -0.25 7.7847 -0.3236 -0.25 5.0198 0.4716 -0.25 7.4491
  [4,15,0.2013,-0.25,7.7019,-1.3737,-0.25,7.7847,-0.3236,-0.25,5.0198,0.4716,-0.25,7.4491],
// 3 15 0.4716 -0.25 7.4491 0.4113 -0.25 7.5879 0.2013 -0.25 7.7019
  [3,15,0.4716,-0.25,7.4491,0.4113,-0.25,7.5879,0.2013,-0.25,7.7019],
// 3 15 -1.3737 -0.25 7.7847 0.2013 -0.25 7.7019 0.1521 -0.25 7.8144
  [3,15,-1.3737,-0.25,7.7847,0.2013,-0.25,7.7019,0.1521,-0.25,7.8144],
// 4 15 2.8018 -0.25 3.9179 2.9827 -0.25 4.0181 3.079 -0.25 4.1274 3.0925 -0.25 4.2164
  [4,15,2.8018,-0.25,3.9179,2.9827,-0.25,4.0181,3.079,-0.25,4.1274,3.0925,-0.25,4.2164],
// 4 15 1.4281 -0.25 3.9356 2.8018 -0.25 3.9179 3.0925 -0.25 4.2164 2.6942 -0.25 5.241
  [4,15,1.4281,-0.25,3.9356,2.8018,-0.25,3.9179,3.0925,-0.25,4.2164,2.6942,-0.25,5.241],
// 3 15 1.533 -0.25 5.2348 1.4254 -0.25 5.1793 1.3478 -0.25 5.0687
  [3,15,1.533,-0.25,5.2348,1.4254,-0.25,5.1793,1.3478,-0.25,5.0687],
// 4 15 1.4281 -0.25 3.9356 1.3478 -0.25 5.0687 1.0887 -0.25 4.2557 1.3777 -0.25 3.9785
  [4,15,1.4281,-0.25,3.9356,1.3478,-0.25,5.0687,1.0887,-0.25,4.2557,1.3777,-0.25,3.9785],
// 4 15 1.0887 -0.25 4.2557 1.1033 -0.25 4.1255 1.154 -0.25 4.0526 1.2262 -0.25 4.0171
  [4,15,1.0887,-0.25,4.2557,1.1033,-0.25,4.1255,1.154,-0.25,4.0526,1.2262,-0.25,4.0171],
// 3 15 1.2262 -0.25 4.0171 1.3777 -0.25 3.9785 1.0887 -0.25 4.2557
  [3,15,1.2262,-0.25,4.0171,1.3777,-0.25,3.9785,1.0887,-0.25,4.2557],
// 4 15 2.6942 -0.25 5.241 1.533 -0.25 5.2348 1.3478 -0.25 5.0687 1.4281 -0.25 3.9356
  [4,15,2.6942,-0.25,5.241,1.533,-0.25,5.2348,1.3478,-0.25,5.0687,1.4281,-0.25,3.9356],
// 3 15 5.0632 -0.25 3.3304 4.4484 -0.25 3.8416 2.7552 -0.25 3.8235
  [3,15,5.0632,-0.25,3.3304,4.4484,-0.25,3.8416,2.7552,-0.25,3.8235],
// 3 15 5.0632 -0.25 3.3304 2.7552 -0.25 3.8235 1.4422 -0.25 3.8505
  [3,15,5.0632,-0.25,3.3304,2.7552,-0.25,3.8235,1.4422,-0.25,3.8505],
// 4 15 2.8018 -0.25 3.9179 1.4281 -0.25 3.9356 1.4422 -0.25 3.8505 2.7552 -0.25 3.8235
  [4,15,2.8018,-0.25,3.9179,1.4281,-0.25,3.9356,1.4422,-0.25,3.8505,2.7552,-0.25,3.8235],
// 4 15 -4.5594 -0.25 7.8 -5.1938 -0.25 8.4652 -5.1831 -0.25 3.3304 -4.4772 -0.25 7.6784
  [4,15,-4.5594,-0.25,7.8,-5.1938,-0.25,8.4652,-5.1831,-0.25,3.3304,-4.4772,-0.25,7.6784],
// 4 15 -2.8691 -0.25 3.9479 -4.2233 -0.25 7.5205 -4.4772 -0.25 7.6784 -5.1831 -0.25 3.3304
  [4,15,-2.8691,-0.25,3.9479,-4.2233,-0.25,7.5205,-4.4772,-0.25,7.6784,-5.1831,-0.25,3.3304],
// 4 15 -5.1831 -0.25 3.3304 5.0632 -0.25 3.3304 1.4422 -0.25 3.8505 -0.4559 -0.25 3.7662
  [4,15,-5.1831,-0.25,3.3304,5.0632,-0.25,3.3304,1.4422,-0.25,3.8505,-0.4559,-0.25,3.7662],
// 3 15 -2.7971 -0.25 3.836 -2.8691 -0.25 3.9479 -5.1831 -0.25 3.3304
  [3,15,-2.7971,-0.25,3.836,-2.8691,-0.25,3.9479,-5.1831,-0.25,3.3304],
// 4 15 0.2082 -0.25 3.9514 0.3335 -0.25 4.0122 0.5217 -0.25 4.1048 0.6578 -0.25 4.233
  [4,15,0.2082,-0.25,3.9514,0.3335,-0.25,4.0122,0.5217,-0.25,4.1048,0.6578,-0.25,4.233],
// 4 15 -0.4559 -0.25 3.7662 0.6578 -0.25 4.233 2.1677 -0.25 7.7571 0.8593 -0.25 7.4271
  [4,15,-0.4559,-0.25,3.7662,0.6578,-0.25,4.233,2.1677,-0.25,7.7571,0.8593,-0.25,7.4271],
// 4 15 2.1677 -0.25 7.7571 1.3732 -0.25 7.7294 1.2137 -0.25 7.6703 0.8593 -0.25 7.4271
  [4,15,2.1677,-0.25,7.7571,1.3732,-0.25,7.7294,1.2137,-0.25,7.6703,0.8593,-0.25,7.4271],
// 4 15 1.0614 -0.25 7.6437 0.973 -0.25 7.5848 0.8593 -0.25 7.4271 1.2137 -0.25 7.6703
  [4,15,1.0614,-0.25,7.6437,0.973,-0.25,7.5848,0.8593,-0.25,7.4271,1.2137,-0.25,7.6703],
// 3 15 0.6578 -0.25 4.233 -0.4559 -0.25 3.7662 0.2082 -0.25 3.9514
  [3,15,0.6578,-0.25,4.233,-0.4559,-0.25,3.7662,0.2082,-0.25,3.9514],
// 3 15 0.1627 -0.25 3.8519 0.2082 -0.25 3.9514 -0.4559 -0.25 3.7662
  [3,15,0.1627,-0.25,3.8519,0.2082,-0.25,3.9514,-0.4559,-0.25,3.7662],
// 3 15 1.4422 -0.25 3.8505 0.1627 -0.25 3.8519 -0.4559 -0.25 3.7662
  [3,15,1.4422,-0.25,3.8505,0.1627,-0.25,3.8519,-0.4559,-0.25,3.7662],
// 3 15 -2.6831 -0.25 3.7641 -2.7971 -0.25 3.836 -5.1831 -0.25 3.3304
  [3,15,-2.6831,-0.25,3.7641,-2.7971,-0.25,3.836,-5.1831,-0.25,3.3304],
// 3 15 -1.7385 -0.25 6.4417 -2.6831 -0.25 3.7641 -0.6049 -0.25 3.8604
  [3,15,-1.7385,-0.25,6.4417,-2.6831,-0.25,3.7641,-0.6049,-0.25,3.8604],
// 4 15 -1.6576 -0.25 6.566 -1.7385 -0.25 6.4417 -0.6049 -0.25 3.8604 -1.5966 -0.25 6.5205
  [4,15,-1.6576,-0.25,6.566,-1.7385,-0.25,6.4417,-0.6049,-0.25,3.8604,-1.5966,-0.25,6.5205],
// 3 15 -0.5418 -0.25 3.79 -0.6049 -0.25 3.8604 -2.6831 -0.25 3.7641
  [3,15,-0.5418,-0.25,3.79,-0.6049,-0.25,3.8604,-2.6831,-0.25,3.7641],
// 4 15 -0.5418 -0.25 3.79 -2.6831 -0.25 3.7641 -5.1831 -0.25 3.3304 -0.4559 -0.25 3.7662
  [4,15,-0.5418,-0.25,3.79,-2.6831,-0.25,3.7641,-5.1831,-0.25,3.3304,-0.4559,-0.25,3.7662],
// 4 15 2.567 -0.25 5.4594 2.0835 -0.25 6.725 1.9757 -0.25 6.7701 1.5113 -0.25 5.4511
  [4,15,2.567,-0.25,5.4594,2.0835,-0.25,6.725,1.9757,-0.25,6.7701,1.5113,-0.25,5.4511],
];
module ldraw_lib__6501596f(step=0, col=false, unit=2/5, alt=false, line=0.2, solid=!$preview)
    makepoly(ldraw_lib__6501596f(), step=step, col=col, unit=unit, alt=alt, line=line, solid=solid);
ldraw_lib__6501596f(line=0.2);
